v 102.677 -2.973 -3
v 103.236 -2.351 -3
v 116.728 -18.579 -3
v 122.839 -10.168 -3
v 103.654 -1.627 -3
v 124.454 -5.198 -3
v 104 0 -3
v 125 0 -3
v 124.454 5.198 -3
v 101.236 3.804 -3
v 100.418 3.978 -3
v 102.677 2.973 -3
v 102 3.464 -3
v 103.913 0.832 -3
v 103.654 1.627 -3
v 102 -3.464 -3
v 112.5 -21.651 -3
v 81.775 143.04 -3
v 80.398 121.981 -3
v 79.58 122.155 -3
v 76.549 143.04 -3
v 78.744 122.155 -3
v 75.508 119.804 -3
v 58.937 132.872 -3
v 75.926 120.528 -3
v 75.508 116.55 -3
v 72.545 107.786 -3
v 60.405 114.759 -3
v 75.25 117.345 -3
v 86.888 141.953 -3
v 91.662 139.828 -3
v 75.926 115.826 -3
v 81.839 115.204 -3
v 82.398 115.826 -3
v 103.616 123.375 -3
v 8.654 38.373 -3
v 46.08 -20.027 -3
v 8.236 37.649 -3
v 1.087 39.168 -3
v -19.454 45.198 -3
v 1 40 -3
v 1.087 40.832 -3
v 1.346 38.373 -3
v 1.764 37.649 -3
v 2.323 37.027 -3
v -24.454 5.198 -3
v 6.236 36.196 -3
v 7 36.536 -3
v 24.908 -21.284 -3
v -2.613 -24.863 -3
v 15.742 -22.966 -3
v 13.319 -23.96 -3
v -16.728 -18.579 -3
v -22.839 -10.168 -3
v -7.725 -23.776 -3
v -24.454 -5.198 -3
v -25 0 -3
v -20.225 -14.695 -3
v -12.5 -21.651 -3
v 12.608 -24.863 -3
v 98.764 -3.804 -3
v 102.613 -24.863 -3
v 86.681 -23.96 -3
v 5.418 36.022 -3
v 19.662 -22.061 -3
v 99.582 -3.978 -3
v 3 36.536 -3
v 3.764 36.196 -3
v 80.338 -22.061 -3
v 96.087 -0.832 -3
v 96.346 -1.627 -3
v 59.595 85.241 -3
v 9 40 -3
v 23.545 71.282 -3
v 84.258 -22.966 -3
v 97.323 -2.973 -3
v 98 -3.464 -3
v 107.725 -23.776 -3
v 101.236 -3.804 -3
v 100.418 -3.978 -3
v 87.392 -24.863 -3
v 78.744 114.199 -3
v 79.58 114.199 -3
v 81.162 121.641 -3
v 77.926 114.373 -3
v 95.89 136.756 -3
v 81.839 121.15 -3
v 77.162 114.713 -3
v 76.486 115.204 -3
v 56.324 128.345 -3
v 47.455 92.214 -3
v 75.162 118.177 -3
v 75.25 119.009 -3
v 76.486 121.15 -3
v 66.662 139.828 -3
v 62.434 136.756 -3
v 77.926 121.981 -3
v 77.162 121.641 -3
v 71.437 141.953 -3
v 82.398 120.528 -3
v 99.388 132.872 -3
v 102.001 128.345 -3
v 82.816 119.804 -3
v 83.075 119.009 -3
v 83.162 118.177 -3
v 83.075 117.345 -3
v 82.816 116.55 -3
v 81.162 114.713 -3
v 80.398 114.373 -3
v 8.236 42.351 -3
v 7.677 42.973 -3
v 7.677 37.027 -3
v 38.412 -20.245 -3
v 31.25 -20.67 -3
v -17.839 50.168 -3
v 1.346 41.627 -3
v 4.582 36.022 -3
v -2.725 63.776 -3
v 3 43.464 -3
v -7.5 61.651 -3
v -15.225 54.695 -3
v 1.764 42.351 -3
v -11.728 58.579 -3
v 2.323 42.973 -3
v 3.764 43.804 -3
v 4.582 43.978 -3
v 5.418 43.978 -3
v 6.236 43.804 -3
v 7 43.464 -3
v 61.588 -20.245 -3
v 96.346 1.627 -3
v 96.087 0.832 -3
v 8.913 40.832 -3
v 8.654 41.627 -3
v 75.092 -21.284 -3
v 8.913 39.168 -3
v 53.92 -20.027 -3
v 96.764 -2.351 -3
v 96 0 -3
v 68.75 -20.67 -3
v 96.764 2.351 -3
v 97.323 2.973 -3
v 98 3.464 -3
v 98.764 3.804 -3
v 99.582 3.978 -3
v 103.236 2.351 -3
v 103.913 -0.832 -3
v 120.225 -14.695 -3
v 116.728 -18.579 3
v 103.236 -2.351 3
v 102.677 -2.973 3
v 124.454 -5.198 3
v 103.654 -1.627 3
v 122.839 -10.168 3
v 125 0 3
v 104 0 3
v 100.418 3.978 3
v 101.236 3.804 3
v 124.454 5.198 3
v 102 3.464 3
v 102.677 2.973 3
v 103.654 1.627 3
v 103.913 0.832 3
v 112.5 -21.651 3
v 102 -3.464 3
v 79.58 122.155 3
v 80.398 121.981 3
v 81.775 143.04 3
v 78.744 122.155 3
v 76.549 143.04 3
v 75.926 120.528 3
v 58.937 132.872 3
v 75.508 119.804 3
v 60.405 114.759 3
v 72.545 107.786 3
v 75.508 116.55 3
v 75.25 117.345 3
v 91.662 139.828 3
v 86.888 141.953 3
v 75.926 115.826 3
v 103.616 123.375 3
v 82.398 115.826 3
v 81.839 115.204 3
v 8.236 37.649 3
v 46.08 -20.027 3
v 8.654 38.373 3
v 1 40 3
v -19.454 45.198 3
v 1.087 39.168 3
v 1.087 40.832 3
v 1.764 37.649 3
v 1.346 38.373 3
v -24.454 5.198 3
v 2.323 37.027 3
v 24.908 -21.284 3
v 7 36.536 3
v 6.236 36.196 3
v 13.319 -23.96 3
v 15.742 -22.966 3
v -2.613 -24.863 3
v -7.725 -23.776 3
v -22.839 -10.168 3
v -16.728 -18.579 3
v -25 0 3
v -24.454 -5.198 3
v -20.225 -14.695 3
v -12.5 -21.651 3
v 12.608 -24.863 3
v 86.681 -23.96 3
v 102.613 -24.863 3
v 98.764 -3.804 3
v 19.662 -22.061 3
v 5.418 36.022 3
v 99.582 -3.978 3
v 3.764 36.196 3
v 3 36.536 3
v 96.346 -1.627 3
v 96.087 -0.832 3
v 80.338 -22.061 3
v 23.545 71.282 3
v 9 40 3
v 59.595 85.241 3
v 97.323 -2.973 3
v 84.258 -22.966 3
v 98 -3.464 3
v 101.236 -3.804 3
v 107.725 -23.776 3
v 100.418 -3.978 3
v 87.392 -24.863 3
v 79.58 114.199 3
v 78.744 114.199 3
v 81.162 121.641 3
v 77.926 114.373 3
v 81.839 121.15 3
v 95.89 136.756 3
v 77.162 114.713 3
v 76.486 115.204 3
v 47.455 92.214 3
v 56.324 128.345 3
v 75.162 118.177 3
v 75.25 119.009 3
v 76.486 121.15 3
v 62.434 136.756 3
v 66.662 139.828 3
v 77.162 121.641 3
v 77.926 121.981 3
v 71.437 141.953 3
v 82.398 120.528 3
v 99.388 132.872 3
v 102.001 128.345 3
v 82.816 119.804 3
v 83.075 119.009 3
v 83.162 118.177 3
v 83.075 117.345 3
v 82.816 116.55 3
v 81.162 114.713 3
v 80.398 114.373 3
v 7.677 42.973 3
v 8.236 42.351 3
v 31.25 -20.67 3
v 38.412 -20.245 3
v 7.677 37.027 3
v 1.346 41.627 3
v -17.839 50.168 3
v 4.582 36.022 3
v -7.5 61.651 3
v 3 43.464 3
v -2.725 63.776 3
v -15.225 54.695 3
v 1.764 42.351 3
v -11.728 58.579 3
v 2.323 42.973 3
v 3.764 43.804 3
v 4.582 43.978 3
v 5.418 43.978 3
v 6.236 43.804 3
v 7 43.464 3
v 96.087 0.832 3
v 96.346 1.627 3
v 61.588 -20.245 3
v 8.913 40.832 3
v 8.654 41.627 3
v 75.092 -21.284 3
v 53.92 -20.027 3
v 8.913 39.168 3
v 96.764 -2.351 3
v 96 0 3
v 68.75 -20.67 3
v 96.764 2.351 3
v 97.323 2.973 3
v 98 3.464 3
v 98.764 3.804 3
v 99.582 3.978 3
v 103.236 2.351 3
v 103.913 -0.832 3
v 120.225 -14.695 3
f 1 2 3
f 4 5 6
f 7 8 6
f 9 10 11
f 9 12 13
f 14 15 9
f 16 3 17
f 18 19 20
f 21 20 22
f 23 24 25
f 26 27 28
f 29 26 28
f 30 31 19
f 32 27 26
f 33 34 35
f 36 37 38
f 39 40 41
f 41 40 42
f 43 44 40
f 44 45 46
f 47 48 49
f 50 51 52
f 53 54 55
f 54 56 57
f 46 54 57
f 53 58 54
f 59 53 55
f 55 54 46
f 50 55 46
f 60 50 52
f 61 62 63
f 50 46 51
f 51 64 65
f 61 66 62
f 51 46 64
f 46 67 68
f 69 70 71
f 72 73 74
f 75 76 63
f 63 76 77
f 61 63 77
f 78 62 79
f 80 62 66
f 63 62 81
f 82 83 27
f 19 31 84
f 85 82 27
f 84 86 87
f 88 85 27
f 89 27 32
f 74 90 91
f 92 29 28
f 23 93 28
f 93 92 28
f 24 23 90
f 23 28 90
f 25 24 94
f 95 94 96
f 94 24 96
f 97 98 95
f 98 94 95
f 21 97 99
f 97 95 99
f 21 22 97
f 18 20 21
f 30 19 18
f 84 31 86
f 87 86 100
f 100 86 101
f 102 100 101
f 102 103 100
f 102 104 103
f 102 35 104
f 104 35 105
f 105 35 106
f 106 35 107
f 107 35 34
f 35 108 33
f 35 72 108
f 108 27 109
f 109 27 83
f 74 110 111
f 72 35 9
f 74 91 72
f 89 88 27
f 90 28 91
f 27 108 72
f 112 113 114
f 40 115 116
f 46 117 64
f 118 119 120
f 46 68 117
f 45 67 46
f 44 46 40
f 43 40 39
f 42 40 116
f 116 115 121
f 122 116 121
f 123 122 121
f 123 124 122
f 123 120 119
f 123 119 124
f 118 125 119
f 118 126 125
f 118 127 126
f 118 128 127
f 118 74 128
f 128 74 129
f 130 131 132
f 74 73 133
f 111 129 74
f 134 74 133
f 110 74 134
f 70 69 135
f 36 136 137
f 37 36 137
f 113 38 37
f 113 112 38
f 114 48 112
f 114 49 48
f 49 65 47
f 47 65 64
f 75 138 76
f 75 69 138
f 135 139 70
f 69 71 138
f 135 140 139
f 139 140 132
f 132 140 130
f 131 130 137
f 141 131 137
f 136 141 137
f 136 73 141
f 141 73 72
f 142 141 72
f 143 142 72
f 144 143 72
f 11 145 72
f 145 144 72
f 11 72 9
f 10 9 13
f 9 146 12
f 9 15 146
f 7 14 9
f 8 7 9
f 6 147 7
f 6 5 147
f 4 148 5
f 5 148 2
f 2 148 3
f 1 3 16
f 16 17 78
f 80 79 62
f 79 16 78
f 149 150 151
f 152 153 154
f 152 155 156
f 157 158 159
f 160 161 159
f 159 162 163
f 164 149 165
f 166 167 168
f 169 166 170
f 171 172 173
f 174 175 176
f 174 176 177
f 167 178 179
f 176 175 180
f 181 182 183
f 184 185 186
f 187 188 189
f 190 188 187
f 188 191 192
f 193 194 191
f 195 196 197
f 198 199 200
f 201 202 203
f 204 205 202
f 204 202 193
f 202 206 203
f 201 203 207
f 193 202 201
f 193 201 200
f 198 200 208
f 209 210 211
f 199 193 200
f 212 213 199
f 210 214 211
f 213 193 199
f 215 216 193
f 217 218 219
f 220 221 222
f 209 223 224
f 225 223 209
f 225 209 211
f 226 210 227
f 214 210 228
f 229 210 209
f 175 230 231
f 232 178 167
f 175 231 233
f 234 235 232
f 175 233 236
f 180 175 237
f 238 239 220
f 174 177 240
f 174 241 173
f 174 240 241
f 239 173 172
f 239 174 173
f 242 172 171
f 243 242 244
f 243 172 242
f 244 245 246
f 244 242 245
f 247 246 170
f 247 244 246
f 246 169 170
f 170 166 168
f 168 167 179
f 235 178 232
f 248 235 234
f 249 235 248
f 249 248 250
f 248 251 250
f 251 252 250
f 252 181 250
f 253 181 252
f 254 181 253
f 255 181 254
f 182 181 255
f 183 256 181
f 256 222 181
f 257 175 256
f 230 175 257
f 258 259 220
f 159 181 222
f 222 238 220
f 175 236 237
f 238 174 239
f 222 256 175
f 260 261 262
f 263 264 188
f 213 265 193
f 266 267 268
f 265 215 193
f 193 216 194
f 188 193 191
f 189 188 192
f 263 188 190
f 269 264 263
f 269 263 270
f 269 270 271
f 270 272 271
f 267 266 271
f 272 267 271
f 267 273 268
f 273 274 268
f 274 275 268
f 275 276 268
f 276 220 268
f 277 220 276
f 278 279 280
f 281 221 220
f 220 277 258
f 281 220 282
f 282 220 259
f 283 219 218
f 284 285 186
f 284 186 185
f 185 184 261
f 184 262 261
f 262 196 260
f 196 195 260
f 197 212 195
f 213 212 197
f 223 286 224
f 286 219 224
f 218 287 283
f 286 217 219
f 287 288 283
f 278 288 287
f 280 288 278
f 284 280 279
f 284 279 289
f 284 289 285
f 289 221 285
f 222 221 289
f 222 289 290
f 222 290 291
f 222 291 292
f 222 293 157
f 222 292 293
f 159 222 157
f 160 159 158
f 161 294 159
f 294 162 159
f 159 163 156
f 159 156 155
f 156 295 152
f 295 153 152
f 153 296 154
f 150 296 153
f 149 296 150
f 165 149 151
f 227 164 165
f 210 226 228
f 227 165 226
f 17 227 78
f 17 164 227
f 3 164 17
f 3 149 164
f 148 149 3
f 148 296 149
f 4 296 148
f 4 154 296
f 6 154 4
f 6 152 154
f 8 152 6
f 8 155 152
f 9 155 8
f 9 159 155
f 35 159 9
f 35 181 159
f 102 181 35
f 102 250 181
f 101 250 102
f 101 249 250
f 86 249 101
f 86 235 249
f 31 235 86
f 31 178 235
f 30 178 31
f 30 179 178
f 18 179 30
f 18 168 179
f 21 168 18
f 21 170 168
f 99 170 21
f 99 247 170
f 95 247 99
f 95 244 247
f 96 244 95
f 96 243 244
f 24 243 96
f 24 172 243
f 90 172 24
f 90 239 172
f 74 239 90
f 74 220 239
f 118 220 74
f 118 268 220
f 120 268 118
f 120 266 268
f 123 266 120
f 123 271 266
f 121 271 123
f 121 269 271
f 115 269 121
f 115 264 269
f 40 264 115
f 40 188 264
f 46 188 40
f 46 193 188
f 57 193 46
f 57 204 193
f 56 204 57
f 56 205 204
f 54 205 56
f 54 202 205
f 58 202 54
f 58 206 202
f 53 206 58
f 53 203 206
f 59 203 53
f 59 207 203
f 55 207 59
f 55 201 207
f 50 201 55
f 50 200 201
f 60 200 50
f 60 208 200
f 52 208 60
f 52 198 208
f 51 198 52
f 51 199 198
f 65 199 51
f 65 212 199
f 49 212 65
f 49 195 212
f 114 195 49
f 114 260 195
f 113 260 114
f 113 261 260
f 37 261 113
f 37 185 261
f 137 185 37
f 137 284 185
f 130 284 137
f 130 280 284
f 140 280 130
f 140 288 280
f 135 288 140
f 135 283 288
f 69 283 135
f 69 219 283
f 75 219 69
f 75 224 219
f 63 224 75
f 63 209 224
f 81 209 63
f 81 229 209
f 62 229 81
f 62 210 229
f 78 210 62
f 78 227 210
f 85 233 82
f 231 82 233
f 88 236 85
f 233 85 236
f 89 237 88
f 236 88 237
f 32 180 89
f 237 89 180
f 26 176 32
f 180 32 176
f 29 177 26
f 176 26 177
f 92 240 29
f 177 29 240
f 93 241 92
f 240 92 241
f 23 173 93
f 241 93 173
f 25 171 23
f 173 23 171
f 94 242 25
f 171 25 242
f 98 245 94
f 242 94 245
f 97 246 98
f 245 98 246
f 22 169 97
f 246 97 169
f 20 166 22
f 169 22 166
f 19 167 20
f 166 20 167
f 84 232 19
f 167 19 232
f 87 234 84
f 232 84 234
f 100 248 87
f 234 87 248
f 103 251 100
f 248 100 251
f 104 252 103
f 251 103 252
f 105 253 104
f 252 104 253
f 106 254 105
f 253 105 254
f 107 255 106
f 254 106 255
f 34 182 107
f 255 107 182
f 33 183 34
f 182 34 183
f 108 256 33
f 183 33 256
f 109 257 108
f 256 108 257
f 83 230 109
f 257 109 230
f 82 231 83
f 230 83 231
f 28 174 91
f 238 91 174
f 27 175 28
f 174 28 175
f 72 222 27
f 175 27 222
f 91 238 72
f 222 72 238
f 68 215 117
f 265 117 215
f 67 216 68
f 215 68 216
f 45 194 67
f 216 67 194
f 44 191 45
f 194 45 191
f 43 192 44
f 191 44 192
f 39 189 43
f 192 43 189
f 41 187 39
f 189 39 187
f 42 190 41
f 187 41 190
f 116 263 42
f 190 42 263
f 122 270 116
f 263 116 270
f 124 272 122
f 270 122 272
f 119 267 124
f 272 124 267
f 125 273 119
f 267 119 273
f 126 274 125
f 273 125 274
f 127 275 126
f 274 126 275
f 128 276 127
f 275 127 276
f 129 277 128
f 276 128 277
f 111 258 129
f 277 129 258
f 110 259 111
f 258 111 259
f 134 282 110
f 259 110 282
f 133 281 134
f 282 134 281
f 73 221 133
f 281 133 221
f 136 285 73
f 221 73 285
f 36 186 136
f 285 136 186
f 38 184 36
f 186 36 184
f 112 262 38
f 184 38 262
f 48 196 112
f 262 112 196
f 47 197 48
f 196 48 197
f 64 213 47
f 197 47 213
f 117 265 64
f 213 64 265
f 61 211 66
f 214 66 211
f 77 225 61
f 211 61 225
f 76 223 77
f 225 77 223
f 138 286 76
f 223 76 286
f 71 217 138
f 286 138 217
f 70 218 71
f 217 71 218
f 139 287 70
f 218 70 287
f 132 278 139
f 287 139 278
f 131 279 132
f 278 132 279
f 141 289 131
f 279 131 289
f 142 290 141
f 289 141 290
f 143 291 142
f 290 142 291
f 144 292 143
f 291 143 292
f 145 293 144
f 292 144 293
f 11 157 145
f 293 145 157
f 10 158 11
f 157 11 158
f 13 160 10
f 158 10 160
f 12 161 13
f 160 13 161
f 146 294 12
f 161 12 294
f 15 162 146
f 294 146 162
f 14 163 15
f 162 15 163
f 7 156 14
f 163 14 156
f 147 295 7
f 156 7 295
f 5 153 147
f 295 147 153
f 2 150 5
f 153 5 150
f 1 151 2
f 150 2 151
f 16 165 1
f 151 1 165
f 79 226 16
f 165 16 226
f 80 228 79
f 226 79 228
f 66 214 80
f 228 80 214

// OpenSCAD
// file: ../MCAD/math.scad
// =============================================================================
// Mathematical Utility Functions
// =============================================================================

// Constants
PI = 3.14159265359;
EPSILON = 0.0001;

// =============================================================================
// TRIGONOMETRIC HELPERS
// =============================================================================

// Convert degrees to radians
function deg_to_rad(degrees) = degrees * PI / 180;

// Convert radians to degrees  
function rad_to_deg(radians) = radians * 180 / PI;

// Normalize angle to 0-360 degrees
function normalize_angle(angle) = 
    angle < 0 ? normalize_angle(angle + 360) :
    angle >= 360 ? normalize_angle(angle - 360) :
    angle;

// =============================================================================
// VECTOR OPERATIONS
// =============================================================================

// Vector magnitude/length
function vector_length(v) = sqrt(v[0]*v[0] + v[1]*v[1] + v[2]*v[2]);

// 2D vector magnitude
function vector_length_2d(v) = sqrt(v[0]*v[0] + v[1]*v[1]);

// Normalize vector to unit length
function normalize_vector(v) = 
    let(len = vector_length(v))
    len > EPSILON ? v / len : [0, 0, 0];

// 2D vector normalization
function normalize_vector_2d(v) = 
    let(len = vector_length_2d(v))
    len > EPSILON ? v / len : [0, 0];

// Dot product
function dot_product(v1, v2) = v1[0]*v2[0] + v1[1]*v2[1] + v1[2]*v2[2];

// 2D dot product
function dot_product_2d(v1, v2) = v1[0]*v2[0] + v1[1]*v2[1];

// Cross product (3D)
function cross_product(v1, v2) = [
    v1[1]*v2[2] - v1[2]*v2[1],
    v1[2]*v2[0] - v1[0]*v2[2], 
    v1[0]*v2[1] - v1[1]*v2[0]
];

// 2D cross product (returns scalar)
function cross_product_2d(v1, v2) = v1[0]*v2[1] - v1[1]*v2[0];

// Distance between two points
function distance(p1, p2) = vector_length(p2 - p1);

// 2D distance between two points
function distance_2d(p1, p2) = vector_length_2d(p2 - p1);

// =============================================================================
// INTERPOLATION FUNCTIONS
// =============================================================================

// Linear interpolation between two values
function lerp(a, b, t) = a + t * (b - a);

// Linear interpolation between two points
function lerp_point(p1, p2, t) = [
    lerp(p1[0], p2[0], t),
    lerp(p1[1], p2[1], t),
    len(p1) > 2 ? lerp(p1[2], p2[2], t) : 0
];

// Smoothstep interpolation (smooth start/end)
function smoothstep(t) = t * t * (3 - 2 * t);

// Smootherstep interpolation (smoother start/end)
function smootherstep(t) = t * t * t * (t * (t * 6 - 15) + 10);

// Clamp value between min and max
function clamp(value, min_val, max_val) = 
    min(max(value, min_val), max_val);

// Map value from one range to another
function map_range(value, from_min, from_max, to_min, to_max) =
    lerp(to_min, to_max, (value - from_min) / (from_max - from_min));

// =============================================================================
// UTILITY FUNCTIONS
// =============================================================================

// Sign function (-1, 0, or 1)
function sign(x) = x > 0 ? 1 : x < 0 ? -1 : 0;

// Check if value is approximately equal (within epsilon)
function approx_equal(a, b, epsilon = EPSILON) = abs(a - b) < epsilon;

// Round to nearest increment
function round_to_increment(value, increment) = 
    round(value / increment) * increment;

// Modulo that works with negative numbers
function mod(a, n) = a - n * floor(a / n);

// =============================================================================
// RANGE AND SEQUENCE FUNCTIONS
// =============================================================================

// Generate range of numbers
function range(start, end, step = 1) = 
    step > 0 && start <= end ? [for (i = [start : step : end]) i] :
    step < 0 && start >= end ? [for (i = [start : step : end]) i] :
    [];

// Generate linearly spaced numbers
function linspace(start, end, num) = 
    num <= 1 ? [start] :
    [for (i = [0 : num-1]) lerp(start, end, i / (num-1))];

// =============================================================================
// BOOLEAN AND COMPARISON HELPERS
// =============================================================================

// Check if point is inside 2D bounding box
function point_in_bbox_2d(point, bbox_min, bbox_max) =
    point[0] >= bbox_min[0] && point[0] <= bbox_max[0] &&
    point[1] >= bbox_min[1] && point[1] <= bbox_max[1];

// Check if point is inside 3D bounding box
function point_in_bbox_3d(point, bbox_min, bbox_max) =
    point[0] >= bbox_min[0] && point[0] <= bbox_max[0] &&
    point[1] >= bbox_min[1] && point[1] <= bbox_max[1] &&
    point[2] >= bbox_min[2] && point[2] <= bbox_max[2];

// =============================================================================
// EXAMPLES AND TESTS
// =============================================================================

// Uncomment to test functions
// echo("Vector length [3,4,5]:", vector_length([3, 4, 5])); // Should be ~7.07
// echo("Normalize [3,4,0]:", normalize_vector([3, 4, 0])); // Should be [0.6, 0.8, 0]
// echo("Lerp 0 to 10 at 0.5:", lerp(0, 10, 0.5)); // Should be 5
// echo("Range 0 to 10 step 2:", range(0, 10, 2)); // Should be [0,2,4,6,8,10]
// file: ../MCAD/triangles.scad
/*
Triangles.scad
 Author: Tim Koopman
 https://github.com/tkoopman/Delta-Diamond/blob/master/OpenSCAD/Triangles.scad

         angleCA
           /|\
        a / H \ c
         /  |  \
 angleAB ------- angleBC
            b

Standard Parameters
	center: true/false
		If true same as centerXYZ = [true, true, true]

	centerXYZ: Vector of 3 true/false values [CenterX, CenterY, CenterZ]
		center must be left undef

	height: The 3D height of the Triangle. Ignored if heights defined

	heights: Vector of 3 height values heights @ [angleAB, angleBC, angleCA]
		If CenterZ is true each height will be centered individually, this means
		the shape will be different depending on CenterZ. Most times you will want
		CenterZ to be true to get the shape most people want.
*/

/* 
Triangle
	a: Length of side a
	b: Length of side b
	angle: angle at point angleAB
*/
module Triangle(
			a, b, angle, height=1, heights=undef,
			center=undef, centerXYZ=[false,false,false])
{
	// Calculate Heights at each point
	heightAB = ((heights==undef) ? height : heights[0])/2;
	heightBC = ((heights==undef) ? height : heights[1])/2;
	heightCA = ((heights==undef) ? height : heights[2])/2;
	centerZ = (center || (center==undef && centerXYZ[2]))?0:max(heightAB,heightBC,heightCA);

	// Calculate Offsets for centering
	offsetX = (center || (center==undef && centerXYZ[0]))?((cos(angle)*a)+b)/3:0;
	offsetY = (center || (center==undef && centerXYZ[1]))?(sin(angle)*a)/3:0;
	
	pointAB1 = [-offsetX,-offsetY, centerZ-heightAB];
	pointAB2 = [-offsetX,-offsetY, centerZ+heightAB];
	pointBC1 = [b-offsetX,-offsetY, centerZ-heightBC];
	pointBC2 = [b-offsetX,-offsetY, centerZ+heightBC];
	pointCA1 = [(cos(angle)*a)-offsetX,(sin(angle)*a)-offsetY, centerZ-heightCA];
	pointCA2 = [(cos(angle)*a)-offsetX,(sin(angle)*a)-offsetY, centerZ+heightCA];

	polyhedron(
		points=[	pointAB1, pointBC1, pointCA1,
					pointAB2, pointBC2, pointCA2 ],
		triangles=[	
			[0, 1, 2],
			[3, 5, 4],
			[0, 3, 1],
			[1, 3, 4],
			[1, 4, 2],
			[2, 4, 5],
			[2, 5, 0],
			[0, 5, 3] ] );
}

/*
Isosceles Triangle
	Exactly 2 of the following paramaters must be defined.
	If all 3 defined H will be ignored.
	b: length of side b
	angle: angle at points angleAB & angleBC.
*/
module Isosceles_Triangle(
			b, angle, H=undef, height=1, heights=undef,
			center=undef, centerXYZ=[true, false, false])
{
	valid = 	(angle!=undef)?((angle < 90) && (b!=undef||H!=undef)) : (b!=undef&&H!=undef);
	ANGLE = (angle!=undef) ? angle : atan(H / (b/2));
	a = (b==undef)?(H/sin((180-(angle*2))/2)) : 
		 (b / cos(ANGLE))/2;
	B = (b==undef)? (cos(angle)*a)*2:b;
	if (valid)
	{
		Triangle(a=a, b=B, angle=ANGLE, height=height, heights=heights,
					center=center, centerXYZ=centerXYZ);
	} else {
		echo("Invalid Isosceles_Triangle. Must specify any 2 of b, angle and H, and if angle used angle must be less than 90");
	}
}

/*
Right Angled Triangle
	Create a Right Angled Triangle where the hypotenuse will be calculated.

       |\
      a| \
       |  \
       ----
         b
	a: length of side a
	b: length of side b
*/
module Right_Angled_Triangle(
			a, b, height=1, heights=undef,
			center=undef, centerXYZ=[false, false, false])
{
	Triangle(a=a, b=b, angle=90, height=height, heights=heights,
				center=center, centerXYZ=centerXYZ);
}

/*
Wedge
	Is same as Right Angled Triangle with 2 different heights, and rotated.
	Good for creating support structures.
*/
module Wedge(a, b, w1, w2)
{
	rotate([90,0,0])
		Right_Angled_Triangle(a, b, heights=[w1, w2, w1], centerXYZ=[false, false, true]);
}

/*
Equilateral Triangle
	Create a Equilateral Triangle.

	l: Length of all sides (a, b & c)
	H: Triangle size will be based on the this 2D height
		When using H, l is ignored.
*/
module Equilateral_Triangle(
			l=10, H=undef, height=1, heights=undef,
			center=undef, centerXYZ=[true,false,false])
{
	L = (H==undef)?l:H/sin(60);
	Triangle(a=L,b=L,angle=60,height=height, heights=heights,
				center=center, centerXYZ=centerXYZ);
}

/*
Trapezoid
	Create a Basic Trapezoid (Based on Isosceles_Triangle)

            d
          /----\
         /  |   \
     a  /   H    \ c
       /    |     \
 angle ------------ angle
            b

	b: Length of side b
	angle: Angle at points angleAB & angleBC
	H: The 2D height at which the triangle should be cut to create the trapezoid
	heights: If vector of size 3 (Standard for triangles) both cd & da will be the same height, if vector have 4 values [ab,bc,cd,da] than each point can have different heights.
*/
module Trapezoid(
			b, angle=60, H, height=1, heights=undef,
			center=undef, centerXYZ=[true,false,false])
{
	validAngle = (angle < 90);
	adX = H / tan(angle);

	// Calculate Heights at each point
	heightAB = ((heights==undef) ? height : heights[0])/2;
	heightBC = ((heights==undef) ? height : heights[1])/2;
	heightCD = ((heights==undef) ? height : heights[2])/2;
	heightDA = ((heights==undef) ? height : ((len(heights) > 3)?heights[3]:heights[2]))/2;

	// Centers
	centerX = (center || (center==undef && centerXYZ[0]))?0:b/2;
	centerY = (center || (center==undef && centerXYZ[1]))?0:H/2;
	centerZ = (center || (center==undef && centerXYZ[2]))?0:max(heightAB,heightBC,heightCD,heightDA);

	// Points
	y = H/2;
	bx = b/2;
	dx = (b-(adX*2))/2;

	pointAB1 = [centerX-bx, centerY-y, centerZ-heightAB];
	pointAB2 = [centerX-bx, centerY-y, centerZ+heightAB];
	pointBC1 = [centerX+bx, centerY-y, centerZ-heightBC];
	pointBC2 = [centerX+bx, centerY-y, centerZ+heightBC];
	pointCD1 = [centerX+dx, centerY+y, centerZ-heightCD];
	pointCD2 = [centerX+dx, centerY+y, centerZ+heightCD];
	pointDA1 = [centerX-dx, centerY+y, centerZ-heightDA];
	pointDA2 = [centerX-dx, centerY+y, centerZ+heightDA];

	validH = (adX < b/2);

	if (validAngle && validH)
	{
		polyhedron(
			points=[	pointAB1, pointBC1, pointCD1, pointDA1,
						pointAB2, pointBC2, pointCD2, pointDA2 ],
			triangles=[	
				[0, 1, 2],
				[0, 2, 3],
				[4, 6, 5],
				[4, 7, 6],
				[0, 4, 1],
				[1, 4, 5],
				[1, 5, 2],
				[2, 5, 6],
				[2, 6, 3],
				[3, 6, 7],
				[3, 7, 0],
				[0, 7, 4]	] );
	} else {
		if (!validAngle) echo("Trapezoid invalid, angle must be less than 90");
		else echo("Trapezoid invalid, H is larger than triangle");
	}
}


// Examples
Triangle(a=5, b=15, angle=33, centerXYZ=[true,false,false]);
translate([20,0,0]) Right_Angled_Triangle(a=5, b=20, centerXYZ=[false,true,false]);
!translate([45,0,0]) Wedge(a=1, b=1, w1=20, w2=20);
translate([-20,0,0]) Trapezoid(b=20, angle=33, H=4, height=5, centerXYZ=[true,false,true]);

translate([0,10,0]) Isosceles_Triangle(b=20, angle=33);
translate([30,10,0]) Isosceles_Triangle(b=20, H=5);
translate([-30,10,0]) Isosceles_Triangle(angle=33, H=5, center=true);

translate([15,-25,0]) Equilateral_Triangle(l=20);
translate([-15,-25,0]) Equilateral_Triangle(H=20);
// file: formulas.scad
// Arm length function
function arm_length(l2, R, v) = 1/2*(sqrt(2)*sqrt(pow(l2, 2)*cos(2*v)-pow(l2, 2)+2*pow(R, 2))-2*l2*cos(v));
  
//Distance between 2 points
function distance(p1, p2) = sqrt(pow(p2[0]-p1[0], 2) + pow(p2[1]-p1[1], 2));
  
// file: common.scad
include <dimensions.scad>;

module nema17_holes(slide) {
  shaft_d = 22;
  screw_d=3;
  s=31;

  module screwhole() {
    hull() {
     translate([-slide/2,0,0]) circle(r=screw_d/2, center=true);
     translate([slide/2,0,0]) circle(h=depth, r=screw_d/2, center=true);
    }
  }

  translate([s/2,s/2,0]) screwhole();
  translate([-s/2,s/2,0]) screwhole();
  translate([s/2,-s/2,0]) screwhole();
  translate([-s/2,-s/2,0]) screwhole();

  circle(r=shaft_d/2, center=true);
}
// file: ../MCAD/motors.scad
// License: GPL 2.0

include <math.scad>


//generates a motor mount for the specified nema standard #.
module stepper_motor_mount(nema_standard,slide_distance=0, mochup=true)
{
	//dimensions from:
	// http://www.numberfactory.com/NEMA%20Motor%20Dimensions.htm
	if (nema_standard == 17)
	{
		_stepper_motor_mount(
			motor_shaft_diameter = 0.1968*mm_per_inche,
			motor_shaft_length = 0.945*mm_per_inche,
			pilot_diameter = 0.866*mm_per_inche,
			pilot_length = 0.80*mm_per_inche,
			mounting_bolt_circle = 1.725*mm_per_inche,
			bolt_hole_size = 3.5,
			bolt_hole_distance = 1.220*mm_per_inche,
			slide_distance = slide_distance,
			mochup = mochup);
	}
	if (nema_standard == 23)
	{
		_stepper_motor_mount(
			motor_shaft_diameter = 0.250*mm_per_inche,
			motor_shaft_length = 0.81*mm_per_inche,
			pilot_diameter = 1.500*mm_per_inche,
			pilot_length = 0.062*mm_per_inche,
			mounting_bolt_circle = 2.625*mm_per_inche,
			bolt_hole_size = 0.195*mm_per_inche,
			bolt_hole_distance = 1.856*mm_per_inche,
			slide_distance = slide_distance,
			mochup = mochup);
	}
	
}


//inner mehod for creating a stepper motor mount of any dimensions
module _stepper_motor_mount(
	motor_shaft_diameter,
	motor_shaft_length,
	pilot_diameter,
	pilot_length,
	mounting_bolt_circle,
	bolt_hole_size,
	bolt_hole_distance,
	slide_distance = 0,
	motor_length = 40, //arbitray - not standardized
	mochup
)
{
	union()
	{
	// == centered mount points ==
	//mounting circle inset
	translate([0,slide_distance/2,0]) circle(r = pilot_diameter/2);
	square([pilot_diameter,slide_distance],center=true);
	translate([0,-slide_distance/2,0]) circle(r = pilot_diameter/2);

	//todo: motor shaft hole
	
	//mounting screw holes
	for (x = [-1,1])
	{
		for (y = [-1,1])
		{
			translate([x*bolt_hole_distance/2,y*bolt_hole_distance/2,0])
			{
				translate([0,slide_distance/2,0]) circle(bolt_hole_size/2);
				translate([0,-slide_distance/2,0]) circle(bolt_hole_size/2);
				square([bolt_hole_size,slide_distance],center=true);
			}
		}
	}
	// == motor mock-up ==
	//motor box
	if (mochup == true)
	{
		%translate([0,0,-5]) cylinder(h = 5, r = pilot_diameter/2);
		%translate(v=[0,0,-motor_length/2])
		{
			cube(size=[bolt_hole_distance+bolt_hole_size+5,bolt_hole_distance+bolt_hole_size+5,motor_length], center = true);
		}
		//shaft
		%translate(v=[0,0,-(motor_length-motor_shaft_length-2)/2])
		{
			%cylinder(r=motor_shaft_diameter/2,h=motor_length+motor_shaft_length--1, center = true);
		}
	}
	};
}
// file: ../MCAD/servos.scad
/**
 * Servo outline library
 *
 * Authors:
 *   - Eero 'rambo' af Heurlin 2010-
 *
 * License: LGPL 2.1
 */

use <triangles.scad>

/**
 * TowerPro SG90 servo
 *
 * @param vector position The position vector
 * @param vector rotation The rotation vector
 * @param boolean screws If defined then "screws" will be added and when the module is differenced() from something if will have holes for the screws
 * @param boolean cables If defined then "cables" output will be added and when the module is differenced() from something if will have holes for the cables output
 * @param number axle_length If defined this will draw a red indicator for the main axle
 */
module towerprosg90(position=undef, rotation=undef, screws = 0, axle_length = 0, cables=0)
{
	translate(position) rotate(rotation) {
        difference(){
            union()
            {
                translate([-5.9,-11.8/2,0]) cube([22.5,11.8,22.7]);
                translate([0,0,22.7-0.1]){
                    cylinder(d=11.8,h=4+0.1);
                    hull(){
                        translate([8.8-5/2,0,0]) cylinder(d=5,h=4+0.1);
                        cylinder(d=5,h=4+0.1);
                    }
                    translate([0,0,4]) cylinder(d=4.6,h=3.2);
                }
                translate([-4.7-5.9,-11.8/2,15.9]) cube([22.5+4.7*2, 11.8, 2.5]); 
            }
            //screw holes
            translate([-2.3-5.9,0,15.9+1.25]) cylinder(d=2,h=5, center=true);
            translate([-2.3-5.9-2,0,15.9+1.25]) cube([3,1.3,5], center=true);
            translate([2.3+22.5-5.9,0,15.9+1.25]) cylinder(d=2,h=5, center=true);
            translate([2.3+22.5-5.9+2,0,15.9+1.25]) cube([3,1.3,5], center=true);
        }
        if (axle_length > 0) {
            color("red", 0.3) translate([0,0,29.9/2]) cylinder(r=1, h=29.9+axle_length, center=true);
        }
        if (cables > 0) color("red", 0.3) translate([-12.4,-1.8,4.5]) cube([10,3.6,1.2]);
        if(screws > 0) color("red", 0.3) {
            translate([-2.3-5.9,0,15.9+1.25]) cylinder(d=2,h=10, center=true);
            translate([2.3+22.5-5.9,0,15.9+1.25]) cylinder(d=2,h=10, center=true);
        }
    }
    
}

/**
 * Align DS420 digital servo
 *
 * @param vector position The position vector
 * @param vector rotation The rotation vector
 * @param boolean screws If defined then "screws" will be added and when the module is differenced() from something if will have holes for the screws
 * @param number axle_lenght If defined this will draw "backgound" indicator for the main axle
 */
module alignds420(position, rotation, screws = 0, axle_lenght = 0)
{
	translate(position)
	{
		rotate(rotation)
	    {
			union()
			{
				// Main axle
				translate([0,0,17])
				{
					cylinder(r=6, h=8, $fn=30);
					cylinder(r=2.5, h=10.5, $fn=20);
				}
				// Box and ears
				translate([-6,-6,0])
				{
					cube([12, 22.8,19.5], false);
					translate([0,-5, 17])
					{
						cube([12, 7, 2.5]);
					}
					translate([0, 20.8, 17])
					{
						cube([12, 7, 2.5]);
					}
				}
				if (screws > 0)
				{
					translate([0,(-10.2 + 1.8),11.5])
					{
						# cylinder(r=1.8/2, h=6, $fn=6);
					}
					translate([0,(21.0 - 1.8),11.5])
					{
						# cylinder(r=1.8/2, h=6, $fn=6);
					}

				}
				// The large slope
				translate([-6,0,19])
				{
					rotate([90,0,90])
					{
						triangle(4, 18, 12);
					}
				}

				/**
				 * This seems to get too complex fast
				// Small additional axes
				translate([0,6,17])
				{
					cylinder(r=2.5, h=6, $fn=10);
					cylinder(r=1.25, h=8, $fn=10);
				}
				// Small slope
				difference()
				{
					translate([-6,-6,19.0])
					{
						cube([12,6.5,4]);
					}
					translate([7,-7,24.0])
					{
						rotate([-90,0,90])
						{
				            triangle(3, 8, 14);
						}
					}

				}
				*/
				// So we render a cube instead of the small slope on a cube
				translate([-6,-6,19.0])
				{
					cube([12,6.5,4]);
				}
			}
			if (axle_lenght > 0)
			{
				% cylinder(r=0.9, h=axle_lenght, center=true, $fn=8);
			}
		}
	}
}

/**
 * Futaba S3003 servo
 *
 * @param vector position The position vector
 * @param vector rotation The rotation vector
 */
module futabas3003(position, rotation)
{
	translate(position)
	{
		rotate(rotation)
	    {
			union()
			{
				// Box and ears
				translate([0,0,0])
				{
					cube([20.1, 39.9, 36.1], false);
					translate([1.1, -7.6, 26.6])
					{
                        difference() {
						    cube([18, 7.6, 2.5]);
                            translate([4, 3.5, 0]) cylinder(100, 2);
                            translate([14, 3.5, 0]) cylinder(100, 2);
                        }
					}

					translate([1.1, 39.9, 26.6])
					{
                        difference() {
                            cube([18, 7.6, 2.5]);
                            translate([4, 4.5, 0]) cylinder(100, 2);
                            translate([14, 4.5, 0]) cylinder(100, 2);
                        }
                    }
				}

				// Main axle
				translate([10, 30, 36.1])
				{
					cylinder(r=6, h=0.4, $fn=30);
					cylinder(r=2.5, h=4.9, $fn=20);
				}
			}
		}
	}
}

// Tests:
module test_alignds420(){alignds420(screws=1);}
// file: dimensions.scad
use <formulas.scad>;

$fn=30;

// Global
span_bottom=100; 
span_bottle=100; 
bottle_rod_diam=8; 
front_rod_diam=8; 
width=450;
span_bottom= 100; // Bottom rods span
span_bottle= 120; // Bottle rods span
board_thickness=6;
nut_t=6;
back_tilt_angle=10;

// Sides
holes_margin=25; 
servo_position=[60,100];
axis_tilt=15; 
axle_position=[5,40];
axis_z=40;
break_position=[40,50];
bottom_extrusion_height=5;

bottle_top_rod_position=[span_bottom-sin(back_tilt_angle)*span_bottle, cos(back_tilt_angle)*span_bottle];
servo_rotation=atan((bottle_top_rod_position[1]-break_position[1])/(bottle_top_rod_position[0]-break_position[0]))-90;

// Right side
bottle_axis_diam=15;
stepper_slide_distance=10;
stepper_x=30;
stepper_z=13;
stepper_rotation=40;
servo_distance_from_axle=50;

// Left side


// X table
arm_width=50;
bottom_arm_width=30;
top_arm_width=30;
//span_axis=40;
span_rods=50;
rod_ext=10;
table_rod_ext=8;
arm_bending=20;
table_rods_diam=8;
table_tilt=10;

// Calculations for arms length
bottle_axle_position=[span_bottom-sin(back_tilt_angle)*span_bottle/2, cos(back_tilt_angle)*span_bottle/2];
axle_bottle_distance = distance(bottle_axle_position, axle_position);
span_axis =arm_length(span_rods/2, axle_bottle_distance, arm_bending);
echo( axle_bottle_distance);
echo( span_axis);

// Bottle
bottle_pos=30;
bottle_diam=70;
bottle_height=300;


// Bottle bar
bottle_bar_width=40;
bottle_bar_height=span_bottle;
bottle_bar_pos=bottle_height+bottle_pos+20;


// Pulley properties
shaftDiameter = 8; // the shaft at the center, will be subtracted from the pulley. Better be too small than too wide.
hubDiameter = 30; // if the hub or timing pulley is big enough to fit a nut, this will be embedded.
hubHeight = 8; // the hub is the thick cylinder connected to the pulley to allow a set screw to go through or as a collar for a nut.
flanges = 2; // the rims that keep the belt from going anywhere
hubSetScewDiameter = 0; // use either a set screw or nut on a shaft. Set to 0 to not use a set screw.
numSetScrews = 3;
numTeeth = 63; // this value together with the pitch determines the pulley diameter
toothType = 2; // 1 = slightly rounded, 2 = oval sharp, 3 = square. For square, set the toothWith a little low.

// Belt properties:
pitch = 2; // distance between the teeth
beltWidth = 6; // the width/height of the belt. The (vertical) size of the pulley is adapted to this.
beltThickness = 0.65; // thickness of the part excluding the notch depth!
notchDepth = 1.8; // make it slightly bigger than actual, there's an outward curvature in the inner solid part of the pulley
toothWidth = 1.4; // Teeth of the PULLEY, that is.
// main file
include <dimensions.scad>;
use <../MCAD/servos.scad>;
use <../MCAD/motors.scad>;
use <common.scad>;

module side() {
  union() {
  top_x_position = span_bottom -sin(back_tilt_angle)*span_bottle;

    difference() {
        // Base plate
        minkowski() {
        circle(holes_margin);
        polygon(points=[
          [0, 0],
          [span_bottom, 0],
          [bottle_top_rod_position[0], bottle_top_rod_position[1]],
          [break_position[0], break_position[1]],
          [axle_position[0], axle_position[1]],
          [0,0]
          ], convexity=1);
        }
        union() {
        // Holes
        translate(axle_position) circle(front_rod_diam/2);
        translate(bottle_top_rod_position) circle(bottle_rod_diam/2);
        translate([span_bottom, 0, 0]) circle(bottle_rod_diam/2);

        // Foot extrusion
        
        translate([span_bottom/2, -holes_margin]) scale([span_bottom/2-holes_margin/2, bottom_extrusion_height, 1]) circle(1);

        // Servo extrusion
        translate(servo_position)
        rotate([0, 0, servo_rotation])
            square([14,26], center=true);
            }
      }
    }
}

module side_r() {
  color("yellow")
  linear_extrude(board_thickness, center=true)
  difference() {
    side();
    union() {
      // Stepper holes
      translate([stepper_x, stepper_z, 0]) rotate([0, 0, stepper_rotation]) nema17_holes(stepper_slide_distance);
      translate([span_bottom - tan(back_tilt_angle)*span_bottle/2, span_bottle/2*cos(back_tilt_angle), 0])
        circle(, r=bottle_axis_diam/2, center=true);
    }
  }
  translate([stepper_x, stepper_z, -board_thickness/2]) 
      rotate([0, 0, stepper_rotation])
      stepper_motor_mount(nema_standard=17);
}

module side_l() {
  color("yellow")
  linear_extrude(board_thickness, center=true)
    mirror([0,0,1]) side();
}

side_l();
